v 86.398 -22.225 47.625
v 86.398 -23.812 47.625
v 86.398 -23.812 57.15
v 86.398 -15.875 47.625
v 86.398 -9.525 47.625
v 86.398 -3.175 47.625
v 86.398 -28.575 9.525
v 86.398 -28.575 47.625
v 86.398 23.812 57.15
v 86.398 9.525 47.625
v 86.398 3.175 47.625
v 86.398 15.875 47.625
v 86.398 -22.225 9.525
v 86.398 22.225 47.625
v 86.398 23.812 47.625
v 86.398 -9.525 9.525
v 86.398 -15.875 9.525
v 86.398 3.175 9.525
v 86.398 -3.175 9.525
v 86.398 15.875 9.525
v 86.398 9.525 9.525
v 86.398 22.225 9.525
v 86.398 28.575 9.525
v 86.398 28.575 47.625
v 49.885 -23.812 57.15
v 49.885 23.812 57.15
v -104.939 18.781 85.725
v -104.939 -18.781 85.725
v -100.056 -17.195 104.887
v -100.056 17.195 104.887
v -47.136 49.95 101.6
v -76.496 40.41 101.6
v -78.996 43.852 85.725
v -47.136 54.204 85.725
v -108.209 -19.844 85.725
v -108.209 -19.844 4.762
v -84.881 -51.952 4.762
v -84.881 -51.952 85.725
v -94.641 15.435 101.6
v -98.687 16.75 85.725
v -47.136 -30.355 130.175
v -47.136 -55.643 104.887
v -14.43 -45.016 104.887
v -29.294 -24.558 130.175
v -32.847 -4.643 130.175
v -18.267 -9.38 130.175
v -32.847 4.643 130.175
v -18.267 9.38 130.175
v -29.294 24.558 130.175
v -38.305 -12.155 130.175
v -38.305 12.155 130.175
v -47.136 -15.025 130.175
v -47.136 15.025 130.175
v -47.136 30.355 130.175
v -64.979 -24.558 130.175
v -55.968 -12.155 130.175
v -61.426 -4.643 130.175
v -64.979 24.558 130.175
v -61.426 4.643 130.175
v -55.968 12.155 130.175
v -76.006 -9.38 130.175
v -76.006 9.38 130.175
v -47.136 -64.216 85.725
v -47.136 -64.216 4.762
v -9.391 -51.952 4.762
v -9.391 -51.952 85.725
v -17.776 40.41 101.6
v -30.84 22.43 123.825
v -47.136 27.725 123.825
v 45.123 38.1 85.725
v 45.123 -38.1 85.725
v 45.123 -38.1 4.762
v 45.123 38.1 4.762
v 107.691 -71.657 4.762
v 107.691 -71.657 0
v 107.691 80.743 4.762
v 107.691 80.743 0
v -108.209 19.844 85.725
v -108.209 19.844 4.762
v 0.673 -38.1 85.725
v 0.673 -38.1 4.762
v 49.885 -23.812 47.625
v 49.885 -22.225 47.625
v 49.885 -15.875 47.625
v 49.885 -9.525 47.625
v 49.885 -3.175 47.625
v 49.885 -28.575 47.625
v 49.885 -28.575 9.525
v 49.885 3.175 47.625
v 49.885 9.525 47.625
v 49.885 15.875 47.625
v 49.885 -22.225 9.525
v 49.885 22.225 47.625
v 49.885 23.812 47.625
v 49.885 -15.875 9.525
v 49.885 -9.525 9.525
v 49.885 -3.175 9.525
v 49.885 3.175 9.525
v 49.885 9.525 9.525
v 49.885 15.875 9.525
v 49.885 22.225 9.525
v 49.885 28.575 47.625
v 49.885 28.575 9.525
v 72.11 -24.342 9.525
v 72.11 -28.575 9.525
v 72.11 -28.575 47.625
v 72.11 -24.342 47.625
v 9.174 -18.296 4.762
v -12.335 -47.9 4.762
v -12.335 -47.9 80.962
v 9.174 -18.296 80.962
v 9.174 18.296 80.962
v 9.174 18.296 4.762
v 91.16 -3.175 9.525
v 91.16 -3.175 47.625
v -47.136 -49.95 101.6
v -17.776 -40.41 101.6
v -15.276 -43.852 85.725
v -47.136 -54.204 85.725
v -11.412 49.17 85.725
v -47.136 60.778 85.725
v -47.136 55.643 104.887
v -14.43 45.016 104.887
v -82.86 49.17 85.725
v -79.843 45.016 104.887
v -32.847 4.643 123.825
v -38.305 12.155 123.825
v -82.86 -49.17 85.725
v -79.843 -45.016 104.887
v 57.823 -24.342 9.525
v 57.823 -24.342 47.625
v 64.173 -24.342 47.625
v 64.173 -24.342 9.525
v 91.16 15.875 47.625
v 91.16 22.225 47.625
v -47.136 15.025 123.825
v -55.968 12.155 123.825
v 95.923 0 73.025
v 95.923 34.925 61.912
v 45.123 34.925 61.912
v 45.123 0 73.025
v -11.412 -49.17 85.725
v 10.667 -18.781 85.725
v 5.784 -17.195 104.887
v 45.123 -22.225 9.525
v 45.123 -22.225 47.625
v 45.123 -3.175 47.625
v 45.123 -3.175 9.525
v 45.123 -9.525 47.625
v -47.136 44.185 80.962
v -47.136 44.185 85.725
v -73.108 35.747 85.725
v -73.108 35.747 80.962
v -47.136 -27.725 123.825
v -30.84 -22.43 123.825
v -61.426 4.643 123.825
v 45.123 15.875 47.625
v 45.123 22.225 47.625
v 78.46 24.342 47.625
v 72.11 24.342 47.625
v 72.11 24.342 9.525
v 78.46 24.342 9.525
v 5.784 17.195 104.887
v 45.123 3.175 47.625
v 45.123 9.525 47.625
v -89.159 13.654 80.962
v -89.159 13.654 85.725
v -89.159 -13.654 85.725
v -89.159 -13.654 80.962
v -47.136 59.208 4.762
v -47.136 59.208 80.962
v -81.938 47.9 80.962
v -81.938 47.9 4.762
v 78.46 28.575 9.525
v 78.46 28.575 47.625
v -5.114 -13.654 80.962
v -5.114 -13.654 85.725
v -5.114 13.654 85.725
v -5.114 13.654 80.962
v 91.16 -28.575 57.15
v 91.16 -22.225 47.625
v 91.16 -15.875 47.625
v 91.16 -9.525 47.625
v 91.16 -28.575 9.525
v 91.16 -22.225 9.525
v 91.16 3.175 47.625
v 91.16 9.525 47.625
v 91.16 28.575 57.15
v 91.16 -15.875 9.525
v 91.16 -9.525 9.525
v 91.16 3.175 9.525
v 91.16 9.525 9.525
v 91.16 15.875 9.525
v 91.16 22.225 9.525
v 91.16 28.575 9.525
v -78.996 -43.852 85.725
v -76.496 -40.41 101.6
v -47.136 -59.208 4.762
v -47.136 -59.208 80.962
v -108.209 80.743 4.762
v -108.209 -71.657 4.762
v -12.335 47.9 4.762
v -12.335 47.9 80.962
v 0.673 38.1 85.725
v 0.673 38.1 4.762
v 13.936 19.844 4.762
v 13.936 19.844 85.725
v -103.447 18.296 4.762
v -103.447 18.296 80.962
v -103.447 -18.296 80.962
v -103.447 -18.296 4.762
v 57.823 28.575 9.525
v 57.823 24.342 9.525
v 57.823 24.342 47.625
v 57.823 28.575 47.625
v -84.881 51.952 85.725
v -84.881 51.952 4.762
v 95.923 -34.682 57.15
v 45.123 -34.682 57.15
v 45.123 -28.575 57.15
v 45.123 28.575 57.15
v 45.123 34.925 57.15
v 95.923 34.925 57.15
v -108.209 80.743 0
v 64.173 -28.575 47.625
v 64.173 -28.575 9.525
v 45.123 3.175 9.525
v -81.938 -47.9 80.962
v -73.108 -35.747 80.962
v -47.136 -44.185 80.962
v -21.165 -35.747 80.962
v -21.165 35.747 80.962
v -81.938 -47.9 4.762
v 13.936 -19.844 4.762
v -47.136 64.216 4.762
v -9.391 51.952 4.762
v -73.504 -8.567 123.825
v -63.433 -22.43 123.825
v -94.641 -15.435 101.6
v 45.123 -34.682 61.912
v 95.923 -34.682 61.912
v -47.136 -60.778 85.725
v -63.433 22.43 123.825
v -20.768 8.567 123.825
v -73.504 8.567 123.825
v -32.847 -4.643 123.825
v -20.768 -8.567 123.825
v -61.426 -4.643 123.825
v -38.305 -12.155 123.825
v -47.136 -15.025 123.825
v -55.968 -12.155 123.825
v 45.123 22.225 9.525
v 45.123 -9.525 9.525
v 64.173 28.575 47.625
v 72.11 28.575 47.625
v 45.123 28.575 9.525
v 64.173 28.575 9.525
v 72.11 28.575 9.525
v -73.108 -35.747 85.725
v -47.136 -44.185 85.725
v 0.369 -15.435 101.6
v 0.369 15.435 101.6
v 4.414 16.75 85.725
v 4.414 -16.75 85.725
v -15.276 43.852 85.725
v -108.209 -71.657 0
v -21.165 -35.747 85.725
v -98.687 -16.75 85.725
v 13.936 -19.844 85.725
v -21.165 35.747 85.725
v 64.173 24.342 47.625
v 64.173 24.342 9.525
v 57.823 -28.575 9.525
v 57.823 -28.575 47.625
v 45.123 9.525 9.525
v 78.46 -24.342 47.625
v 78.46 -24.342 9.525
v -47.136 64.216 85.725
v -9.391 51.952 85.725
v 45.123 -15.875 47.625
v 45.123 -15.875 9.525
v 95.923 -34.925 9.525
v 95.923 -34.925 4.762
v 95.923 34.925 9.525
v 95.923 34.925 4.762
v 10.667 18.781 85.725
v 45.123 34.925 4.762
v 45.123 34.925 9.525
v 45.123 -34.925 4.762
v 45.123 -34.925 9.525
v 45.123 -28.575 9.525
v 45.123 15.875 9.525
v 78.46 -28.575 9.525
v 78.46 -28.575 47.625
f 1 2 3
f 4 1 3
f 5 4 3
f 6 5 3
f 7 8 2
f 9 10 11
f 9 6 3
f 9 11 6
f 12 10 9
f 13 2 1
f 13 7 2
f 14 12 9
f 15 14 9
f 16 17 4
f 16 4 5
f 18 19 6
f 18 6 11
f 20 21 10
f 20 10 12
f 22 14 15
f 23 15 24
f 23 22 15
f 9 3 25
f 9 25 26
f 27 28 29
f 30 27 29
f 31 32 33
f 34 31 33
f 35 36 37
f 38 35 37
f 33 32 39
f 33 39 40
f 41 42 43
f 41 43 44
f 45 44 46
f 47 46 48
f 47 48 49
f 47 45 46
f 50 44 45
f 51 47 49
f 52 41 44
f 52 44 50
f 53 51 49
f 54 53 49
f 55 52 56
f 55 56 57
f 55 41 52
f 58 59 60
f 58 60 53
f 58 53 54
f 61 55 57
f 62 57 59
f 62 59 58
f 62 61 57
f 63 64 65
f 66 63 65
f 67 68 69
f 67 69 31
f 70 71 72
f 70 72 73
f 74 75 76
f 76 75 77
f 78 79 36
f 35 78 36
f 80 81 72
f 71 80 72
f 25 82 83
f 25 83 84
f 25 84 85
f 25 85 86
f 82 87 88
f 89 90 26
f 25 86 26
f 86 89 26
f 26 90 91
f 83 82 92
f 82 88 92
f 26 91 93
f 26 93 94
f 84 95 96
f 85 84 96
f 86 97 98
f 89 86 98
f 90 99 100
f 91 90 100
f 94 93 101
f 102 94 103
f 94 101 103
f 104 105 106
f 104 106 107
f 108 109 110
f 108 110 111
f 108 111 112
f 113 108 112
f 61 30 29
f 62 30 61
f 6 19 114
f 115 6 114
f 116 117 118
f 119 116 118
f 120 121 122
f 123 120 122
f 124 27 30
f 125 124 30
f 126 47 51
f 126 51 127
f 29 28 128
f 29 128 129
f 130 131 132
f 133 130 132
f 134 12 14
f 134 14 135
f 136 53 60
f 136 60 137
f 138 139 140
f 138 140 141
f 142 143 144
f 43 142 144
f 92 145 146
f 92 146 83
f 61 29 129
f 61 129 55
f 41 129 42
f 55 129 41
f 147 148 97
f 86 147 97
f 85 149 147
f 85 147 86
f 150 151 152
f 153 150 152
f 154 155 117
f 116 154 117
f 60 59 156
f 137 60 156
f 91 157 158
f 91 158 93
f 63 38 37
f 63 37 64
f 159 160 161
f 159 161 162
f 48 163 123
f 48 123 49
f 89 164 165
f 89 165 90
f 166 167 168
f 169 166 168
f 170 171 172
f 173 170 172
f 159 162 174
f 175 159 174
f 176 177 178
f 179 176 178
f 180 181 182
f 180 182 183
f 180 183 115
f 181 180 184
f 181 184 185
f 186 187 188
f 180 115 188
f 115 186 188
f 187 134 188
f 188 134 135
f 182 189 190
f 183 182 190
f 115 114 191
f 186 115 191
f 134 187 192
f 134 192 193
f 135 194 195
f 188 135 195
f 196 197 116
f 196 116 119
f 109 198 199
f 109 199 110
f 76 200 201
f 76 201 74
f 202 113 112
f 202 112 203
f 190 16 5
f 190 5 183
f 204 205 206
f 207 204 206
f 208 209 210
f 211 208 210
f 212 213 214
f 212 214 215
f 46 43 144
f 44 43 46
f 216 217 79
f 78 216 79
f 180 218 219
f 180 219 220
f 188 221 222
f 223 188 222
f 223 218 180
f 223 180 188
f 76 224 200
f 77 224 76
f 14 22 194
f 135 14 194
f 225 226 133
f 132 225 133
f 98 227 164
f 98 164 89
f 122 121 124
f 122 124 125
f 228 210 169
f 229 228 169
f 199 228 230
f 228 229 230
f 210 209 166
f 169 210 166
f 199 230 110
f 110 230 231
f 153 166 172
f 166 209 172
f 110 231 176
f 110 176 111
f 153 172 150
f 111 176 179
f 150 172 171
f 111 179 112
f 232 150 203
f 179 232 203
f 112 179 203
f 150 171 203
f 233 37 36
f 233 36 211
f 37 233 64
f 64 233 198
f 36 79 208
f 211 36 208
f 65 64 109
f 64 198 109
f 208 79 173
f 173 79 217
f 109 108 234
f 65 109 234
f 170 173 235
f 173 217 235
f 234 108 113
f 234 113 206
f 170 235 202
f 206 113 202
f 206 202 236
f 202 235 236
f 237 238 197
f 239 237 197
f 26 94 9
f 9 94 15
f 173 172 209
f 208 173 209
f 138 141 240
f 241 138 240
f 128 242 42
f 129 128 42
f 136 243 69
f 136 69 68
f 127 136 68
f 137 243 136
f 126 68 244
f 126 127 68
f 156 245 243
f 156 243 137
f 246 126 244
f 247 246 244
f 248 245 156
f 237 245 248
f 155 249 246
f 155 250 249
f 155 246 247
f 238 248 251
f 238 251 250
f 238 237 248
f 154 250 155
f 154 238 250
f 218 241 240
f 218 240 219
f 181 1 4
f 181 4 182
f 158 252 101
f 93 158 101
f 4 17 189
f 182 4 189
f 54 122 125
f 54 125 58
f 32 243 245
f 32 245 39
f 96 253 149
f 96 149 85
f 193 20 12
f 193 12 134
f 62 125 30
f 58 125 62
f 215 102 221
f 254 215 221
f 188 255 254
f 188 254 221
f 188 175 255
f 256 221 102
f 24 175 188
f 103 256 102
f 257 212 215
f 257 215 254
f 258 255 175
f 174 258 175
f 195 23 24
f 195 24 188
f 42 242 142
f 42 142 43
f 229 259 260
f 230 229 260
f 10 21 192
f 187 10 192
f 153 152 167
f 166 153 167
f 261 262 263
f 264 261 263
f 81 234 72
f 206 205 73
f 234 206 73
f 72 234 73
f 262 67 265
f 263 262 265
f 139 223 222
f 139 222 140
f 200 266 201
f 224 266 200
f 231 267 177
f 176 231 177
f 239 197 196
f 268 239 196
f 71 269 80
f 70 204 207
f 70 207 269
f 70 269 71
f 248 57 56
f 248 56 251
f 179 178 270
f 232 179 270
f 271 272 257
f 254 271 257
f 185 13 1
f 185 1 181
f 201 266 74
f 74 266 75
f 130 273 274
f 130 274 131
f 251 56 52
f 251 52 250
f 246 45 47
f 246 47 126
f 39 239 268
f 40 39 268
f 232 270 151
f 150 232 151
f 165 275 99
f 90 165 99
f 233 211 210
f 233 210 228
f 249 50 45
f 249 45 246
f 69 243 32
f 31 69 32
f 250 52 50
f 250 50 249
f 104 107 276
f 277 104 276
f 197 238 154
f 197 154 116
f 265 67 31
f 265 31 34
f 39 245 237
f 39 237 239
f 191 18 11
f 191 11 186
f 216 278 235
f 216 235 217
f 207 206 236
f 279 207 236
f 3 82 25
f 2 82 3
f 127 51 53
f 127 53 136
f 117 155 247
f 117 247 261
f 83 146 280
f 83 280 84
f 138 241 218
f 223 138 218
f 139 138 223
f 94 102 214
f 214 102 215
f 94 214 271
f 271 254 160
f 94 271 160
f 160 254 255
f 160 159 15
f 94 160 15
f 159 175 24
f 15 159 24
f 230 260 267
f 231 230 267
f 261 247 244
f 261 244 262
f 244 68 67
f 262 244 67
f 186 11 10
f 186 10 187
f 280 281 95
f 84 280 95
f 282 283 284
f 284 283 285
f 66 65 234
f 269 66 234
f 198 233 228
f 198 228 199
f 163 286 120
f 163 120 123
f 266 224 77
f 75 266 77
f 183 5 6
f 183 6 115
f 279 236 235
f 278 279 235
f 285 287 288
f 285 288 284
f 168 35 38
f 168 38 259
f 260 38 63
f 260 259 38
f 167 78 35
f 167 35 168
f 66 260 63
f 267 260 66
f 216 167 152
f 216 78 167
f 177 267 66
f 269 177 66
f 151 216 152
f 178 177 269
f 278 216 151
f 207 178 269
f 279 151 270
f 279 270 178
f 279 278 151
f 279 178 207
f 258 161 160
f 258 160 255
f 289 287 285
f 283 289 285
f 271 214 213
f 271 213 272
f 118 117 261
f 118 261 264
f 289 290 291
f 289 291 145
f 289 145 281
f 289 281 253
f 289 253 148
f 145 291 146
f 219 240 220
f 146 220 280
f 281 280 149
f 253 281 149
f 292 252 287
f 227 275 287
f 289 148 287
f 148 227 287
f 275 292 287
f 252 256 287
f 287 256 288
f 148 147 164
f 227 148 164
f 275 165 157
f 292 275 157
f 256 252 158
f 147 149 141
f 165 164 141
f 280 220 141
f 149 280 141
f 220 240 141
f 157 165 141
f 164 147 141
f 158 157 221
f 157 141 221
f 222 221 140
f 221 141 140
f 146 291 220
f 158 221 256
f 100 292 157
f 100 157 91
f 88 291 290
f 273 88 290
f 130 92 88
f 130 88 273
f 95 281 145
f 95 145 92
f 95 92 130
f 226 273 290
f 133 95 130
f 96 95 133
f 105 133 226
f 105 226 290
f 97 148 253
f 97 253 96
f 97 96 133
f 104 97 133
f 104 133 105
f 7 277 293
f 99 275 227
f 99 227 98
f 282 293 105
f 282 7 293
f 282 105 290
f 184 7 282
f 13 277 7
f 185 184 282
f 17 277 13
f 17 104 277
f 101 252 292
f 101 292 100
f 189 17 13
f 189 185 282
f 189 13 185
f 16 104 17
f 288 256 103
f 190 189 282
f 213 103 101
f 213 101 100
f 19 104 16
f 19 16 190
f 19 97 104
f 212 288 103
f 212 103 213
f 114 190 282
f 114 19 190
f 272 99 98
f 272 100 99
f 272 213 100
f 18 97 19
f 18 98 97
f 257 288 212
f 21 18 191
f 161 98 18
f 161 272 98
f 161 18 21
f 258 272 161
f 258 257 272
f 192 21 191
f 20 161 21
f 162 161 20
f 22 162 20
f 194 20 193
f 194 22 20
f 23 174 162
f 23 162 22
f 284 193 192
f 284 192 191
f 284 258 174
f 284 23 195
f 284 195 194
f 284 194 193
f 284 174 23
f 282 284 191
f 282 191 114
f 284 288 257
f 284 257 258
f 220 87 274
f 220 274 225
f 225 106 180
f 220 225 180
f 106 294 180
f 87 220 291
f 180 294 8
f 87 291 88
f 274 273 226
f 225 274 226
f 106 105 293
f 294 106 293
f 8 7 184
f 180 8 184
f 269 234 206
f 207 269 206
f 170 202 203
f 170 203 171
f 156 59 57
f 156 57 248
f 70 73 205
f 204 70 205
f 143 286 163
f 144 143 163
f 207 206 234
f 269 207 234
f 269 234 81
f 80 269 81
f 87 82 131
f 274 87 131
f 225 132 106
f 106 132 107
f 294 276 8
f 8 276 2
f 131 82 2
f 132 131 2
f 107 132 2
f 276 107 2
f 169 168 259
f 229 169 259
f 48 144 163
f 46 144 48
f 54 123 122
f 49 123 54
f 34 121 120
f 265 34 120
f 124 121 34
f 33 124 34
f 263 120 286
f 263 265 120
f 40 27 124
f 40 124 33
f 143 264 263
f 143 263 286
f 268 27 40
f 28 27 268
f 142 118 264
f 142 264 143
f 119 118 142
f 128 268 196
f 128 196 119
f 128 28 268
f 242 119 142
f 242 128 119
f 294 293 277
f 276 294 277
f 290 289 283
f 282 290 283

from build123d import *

# Parameters (mm, degrees)
F0_W      = 215.9
F0_H      = 152.4
F1_DEPTH  = 4.7625
F3_DEPTH  = 80.9625
F4_T      = -4.7625
F6_DEPTH  = 25.4
F7_DEPTH  = 80.9625
F8_W      = 50.8
F8_H      = 69.85
F9_DEPTH  = 4.7625
F10_W     = 4.7625
F10_H     = 6.35
F10_W_2   = 6.35
F10_H_2   = 4.2333333333
F11_DEPTH = 38.1
F12_W     = 46.0375
F12_H     = 57.15
F12_W_2   = 36.5125
F12_H_2   = 47.625
F13_DEPTH = 9.525
F15_DEPTH = 50.8


with BuildPart() as f1:
    # F0 (on Top) → F1 (new body)
    with BuildSketch(Plane.XY):
        with Locations((-0.2590711229, 4.5428941069)):
            Rectangle(F0_W, F0_H)
    extrude(amount=F1_DEPTH)


with BuildPart() as f3:
    # F2 (on face) → F3 (new body)
    with BuildSketch(Plane.XY.offset(4.7625)):
        Polygon((-9.3912329416, 51.9516119643), (-47.136288432, 64.2157239285), (-84.8813439225, 51.9516119643), (-108.2090711229, 19.84375), (-108.2090711229, -19.84375), (-84.8813439225, -51.9516119643), (-47.136288432, -64.2157239285), (-9.3912329416, -51.9516119643), (0.6725522319, -38.1), (13.9364942588, -19.84375), (13.9364942588, 19.84375), (0.6725522319, 38.1), align=None)
    extrude(amount=F3_DEPTH)

    # F4
    f4_openings = [f3.faces().sort_by_distance(p)[0] for p in [
        (-47.136288, 0, 4.7625),
    ]]
    offset(amount=F4_T, openings=f4_openings)

    # F5 (on face) → F6 (cut)
    with BuildSketch(Plane.XY.offset(85.725)):
        Polygon((-73.1077964368, 35.7467140651), (-89.1590711229, 13.6540297868), (-89.1590711229, -13.6540297868), (-73.1077964368, -35.7467140651), (-47.136288432, -44.1853685568), (-21.1647804273, -35.7467140651), (-5.1135057412, -13.6540297868), (-5.1135057412, 13.6540297868), (-21.1647804273, 35.7467140651), (-47.136288432, 44.1853685568), align=None)
    extrude(amount=-F6_DEPTH, mode=Mode.SUBTRACT)


with BuildPart() as f7:
    # F2 (on face) → F7 (new body, through all)
    with BuildSketch(Plane.XY.offset(4.7625)):
        Polygon((45.1225522319, 38.1), (0.6725522319, 38.1), (13.9364942588, 19.84375), (13.9364942588, -19.84375), (0.6725522319, -38.1), (45.1225522319, -38.1), (45.1225522319, 0), align=None)
    extrude(amount=F7_DEPTH)


with BuildPart() as f9:
    # F8 (on face) → F9 (new body)
    with BuildSketch(Plane.XY.offset(4.7625)):
        with Locations((70.5225522319, 0)):
            Rectangle(F8_W, F8_H)
    extrude(amount=F9_DEPTH)

    # F10 (on face) → F11 (join)
    with BuildSketch(Plane.XY.offset(9.525)):
        with Locations((88.7788022319, 25.4)):
            Rectangle(F10_W, F10_H)
        with Locations((88.7788022319, 12.7)):
            Rectangle(F10_W, F10_H)
        with Locations((88.7788022319, 0)):
            Rectangle(F10_W, F10_H)
        with Locations((88.7788022319, -12.7)):
            Rectangle(F10_W, F10_H)
        with Locations((88.7788022319, -25.4)):
            Rectangle(F10_W, F10_H)
        with Locations((75.2850522319, 26.4583333333)):
            Rectangle(F10_W_2, F10_H_2)
        with Locations((47.5038022319, 25.4)):
            Rectangle(F10_W, F10_H)
        with Locations((47.5038022319, 12.7)):
            Rectangle(F10_W, F10_H)
        with Locations((47.5038022319, 0)):
            Rectangle(F10_W, F10_H)
        with Locations((47.5038022319, -12.7)):
            Rectangle(F10_W, F10_H)
        with Locations((47.5038022319, -25.4)):
            Rectangle(F10_W, F10_H)
        with Locations((75.2850522319, -26.4583333333)):
            Rectangle(F10_W_2, F10_H_2)
        with Locations((60.9975522319, -26.4583333333)):
            Rectangle(F10_W_2, F10_H_2)
        with Locations((60.9975522319, 26.4583333333)):
            Rectangle(F10_W_2, F10_H_2)
    extrude(amount=F11_DEPTH)

    # F12 (on face) → F13 (join)
    with BuildSketch(Plane.XY.offset(47.625)):
        with Locations((68.1413022319, 0)):
            Rectangle(F12_W, F12_H)
        with Locations((68.1413022319, 0)):
            Rectangle(F12_W_2, F12_H_2, mode=Mode.SUBTRACT)
    extrude(amount=F13_DEPTH)

    # F14 (on face) → F15 (join)
    with BuildSketch(Plane.YZ.offset(95.9225522319)):
        Polygon((-34.6816889942, 57.15), (-28.3316889942, 57.15), (28.575, 57.15), (34.925, 57.15), (34.925, 61.9125), (0, 73.025), (-34.6816889942, 61.9125), align=None)
    extrude(amount=-F15_DEPTH)


with BuildPart() as f18:
    # F18: sweep along a path in F5
    with BuildLine(Plane.XY.offset(85.725)) as f18_path:
        Line((-5.1135057412, -13.6540297868), (-21.1647804273, -35.7467140651))
        Line((-21.1647804273, -35.7467140651), (-47.136288432, -44.1853685568))
        Line((-47.136288432, -44.1853685568), (-73.1077964368, -35.7467140651))
        Line((-73.1077964368, -35.7467140651), (-89.1590711229, -13.6540297868))
        Line((-89.1590711229, -13.6540297868), (-89.1590711229, 13.6540297868))
        Line((-89.1590711229, 13.6540297868), (-73.1077964368, 35.7467140651))
        Line((-73.1077964368, 35.7467140651), (-47.136288432, 44.1853685568))
        Line((-47.136288432, 44.1853685568), (-21.1647804273, 35.7467140651))
        Line((-21.1647804273, 35.7467140651), (-5.1135057412, 13.6540297868))
        Line((-5.1135057412, 13.6540297868), (-5.1135057412, -13.6540297868))
    # F17 (on mid) → F18 (sweep)
    with BuildSketch(Plane(origin=(-4.5011150194, -13.8530075941, 0), x_dir=(0.9510565163, -0.3090169944, 0), z_dir=(-0.3090169944, -0.9510565163, 0))):
        Polygon((5.1206323029, 101.6), (9.3743257327, 85.725), (15.9483294784, 85.725), (10.8138865512, 104.8870018728), (-14.474111576, 130.175), (-29.8043676971, 130.175), (-29.8043676971, 123.825), (-17.1043676971, 123.825), align=None)
    sweep(path=f18_path.line, transition=Transition.RIGHT)


solid = Compound([f1.part, f3.part, f7.part, f9.part, f18.part])
